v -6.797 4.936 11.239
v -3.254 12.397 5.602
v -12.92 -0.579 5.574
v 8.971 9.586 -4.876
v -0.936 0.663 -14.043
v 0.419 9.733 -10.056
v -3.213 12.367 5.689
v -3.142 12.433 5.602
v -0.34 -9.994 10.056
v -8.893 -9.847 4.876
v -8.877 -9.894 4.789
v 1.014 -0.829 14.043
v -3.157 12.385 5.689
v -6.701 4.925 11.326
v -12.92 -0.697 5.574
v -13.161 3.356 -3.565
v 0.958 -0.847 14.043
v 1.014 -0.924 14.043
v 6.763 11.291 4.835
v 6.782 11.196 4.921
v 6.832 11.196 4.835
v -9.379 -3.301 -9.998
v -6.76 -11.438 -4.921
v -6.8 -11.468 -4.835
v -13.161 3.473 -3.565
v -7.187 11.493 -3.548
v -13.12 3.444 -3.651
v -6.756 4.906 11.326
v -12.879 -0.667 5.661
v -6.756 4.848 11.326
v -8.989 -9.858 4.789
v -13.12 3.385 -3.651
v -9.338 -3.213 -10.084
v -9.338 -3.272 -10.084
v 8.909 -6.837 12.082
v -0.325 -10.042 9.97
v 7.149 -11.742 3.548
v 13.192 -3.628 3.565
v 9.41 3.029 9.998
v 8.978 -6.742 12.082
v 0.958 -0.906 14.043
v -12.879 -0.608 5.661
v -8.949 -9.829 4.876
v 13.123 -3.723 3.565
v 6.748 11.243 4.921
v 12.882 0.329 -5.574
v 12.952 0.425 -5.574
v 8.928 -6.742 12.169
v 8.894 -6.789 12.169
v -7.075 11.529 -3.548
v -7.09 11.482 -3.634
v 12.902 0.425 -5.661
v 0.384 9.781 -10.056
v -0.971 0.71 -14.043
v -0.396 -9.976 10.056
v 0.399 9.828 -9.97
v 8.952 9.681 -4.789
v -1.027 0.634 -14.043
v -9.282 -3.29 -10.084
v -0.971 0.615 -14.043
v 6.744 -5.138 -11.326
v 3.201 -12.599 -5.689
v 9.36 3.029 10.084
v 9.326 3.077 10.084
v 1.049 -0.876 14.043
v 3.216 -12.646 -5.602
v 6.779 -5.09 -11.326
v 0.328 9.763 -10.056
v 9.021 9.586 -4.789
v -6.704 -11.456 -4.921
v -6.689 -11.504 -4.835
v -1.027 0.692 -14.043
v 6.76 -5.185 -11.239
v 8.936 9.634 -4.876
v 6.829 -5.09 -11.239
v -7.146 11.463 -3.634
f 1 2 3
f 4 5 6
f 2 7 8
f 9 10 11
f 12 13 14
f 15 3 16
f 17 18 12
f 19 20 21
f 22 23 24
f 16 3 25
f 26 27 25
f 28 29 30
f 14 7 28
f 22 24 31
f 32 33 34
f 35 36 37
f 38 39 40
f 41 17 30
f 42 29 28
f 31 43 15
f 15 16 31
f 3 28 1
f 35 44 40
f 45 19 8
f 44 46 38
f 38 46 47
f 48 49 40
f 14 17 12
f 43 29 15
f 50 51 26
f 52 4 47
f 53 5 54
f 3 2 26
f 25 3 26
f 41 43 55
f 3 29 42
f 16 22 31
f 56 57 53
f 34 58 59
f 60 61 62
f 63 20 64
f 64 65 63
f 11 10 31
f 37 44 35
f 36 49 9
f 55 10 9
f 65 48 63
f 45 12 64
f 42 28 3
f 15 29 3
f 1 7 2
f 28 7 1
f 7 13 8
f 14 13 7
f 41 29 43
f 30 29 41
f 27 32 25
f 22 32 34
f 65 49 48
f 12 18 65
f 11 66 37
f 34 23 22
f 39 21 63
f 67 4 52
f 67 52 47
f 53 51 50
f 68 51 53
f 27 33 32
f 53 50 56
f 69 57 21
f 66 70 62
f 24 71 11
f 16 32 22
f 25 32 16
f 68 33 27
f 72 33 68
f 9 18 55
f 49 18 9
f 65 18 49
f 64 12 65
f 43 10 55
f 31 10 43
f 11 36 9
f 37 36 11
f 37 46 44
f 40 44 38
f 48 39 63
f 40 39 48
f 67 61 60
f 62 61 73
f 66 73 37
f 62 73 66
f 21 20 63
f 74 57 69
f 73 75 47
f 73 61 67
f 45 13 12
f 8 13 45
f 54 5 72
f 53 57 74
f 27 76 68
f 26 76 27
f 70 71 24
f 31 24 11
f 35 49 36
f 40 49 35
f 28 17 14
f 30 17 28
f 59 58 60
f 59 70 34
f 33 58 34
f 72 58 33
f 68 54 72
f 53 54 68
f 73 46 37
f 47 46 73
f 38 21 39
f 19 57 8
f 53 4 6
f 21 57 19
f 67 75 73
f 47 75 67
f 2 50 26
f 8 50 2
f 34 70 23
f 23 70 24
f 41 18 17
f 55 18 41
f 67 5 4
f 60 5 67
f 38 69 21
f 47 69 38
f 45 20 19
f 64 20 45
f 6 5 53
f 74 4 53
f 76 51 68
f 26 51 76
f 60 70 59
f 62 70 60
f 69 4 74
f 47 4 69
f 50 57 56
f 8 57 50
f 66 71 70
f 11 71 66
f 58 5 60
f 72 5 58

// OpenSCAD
// Auto-generated OpenSCAD file

    inner_points = 10*[[0.0998930354475761, -0.08761839771919257, 1.3956184279718415], [0.6728697039772034, -0.5090233371692008, -1.1239485150914914], [-0.6716026362296299, 0.487698807845633, 1.1239485150914914], [-0.0986259677000027, 0.06629386839562477, -1.3956184279718415], [-0.8908119004872508, -0.979928839088502, 0.47892884316814505], [-0.6719542878696155, -1.1408912029313139, -0.48346009215137703], [0.673221355617189, 1.1195666736077459, 0.48346009215137703], [0.8920789682348242, 0.9586043097649343, -0.47892884316814505], [0.7118307070376008, -1.1647302272134858, 0.35475514127068664], [-1.3079711835867545, 0.3414697712678377, -0.35648592437079285], [1.3092382513343277, -0.36279430059140544, 0.35648592437079285], [-0.7105636392900273, 1.1434056978899179, -0.35475514127068664], [-0.035585740512491165, -0.9946621663535183, 0.9969743473109073], [0.3185333153995008, -1.2551047419607149, -0.5602036604329037], [-1.28389195945964, -0.06377937343702057, 0.5574031945497779], [-0.9297729035476481, -0.3242219490442169, -0.999774813194033], [0.9310399712952215, 0.30289741972064915, 0.999774813194033], [1.2851590272072133, 0.04245484411345278, -0.5574031945497779], [-0.31726624765192735, 1.2337802126371469, 0.5602036604329037], [0.03685280826006457, 0.9733376370299506, -0.9969743473109073], [0.8878158417756826, -0.674182307300777, 1.208213968994985]];

    outer_points = 10*[[0.03282366802055475, -1.3176403726430708, 0.4756805091246931], [-0.08493614308928757, 0.6642367211098263, -1.2308943583788188], [0.08493614308928757, -0.6642367211098263, 1.2308943583788188], [-0.03282366802055475, 1.3176403726430708, -0.4756805091246931], [-1.283421516714085, -0.3785048441443724, 0.4160394031302599], [-1.3284017620492774, 0.3785048441443724, -0.2358141919097333], [1.3284017620492774, -0.3785048441443724, 0.2358141919097333], [1.283421516714085, 0.3785048441443724, -0.4160394031302599], [-0.5670299754236185, -0.8553164840436631, -0.9541678105326641], [-0.43059774445579446, 0.8553164840436631, 1.0230077155892763], [0.43059774445579446, -0.8553164840436631, -1.0230077155892763], [0.5670299754236185, 0.8553164840436631, 0.9541678105326641], [-0.8128678745041953, -1.141048361009117, -0.027927549120190846], [-0.8856474402788453, 0.0838190444550353, -1.0826488215837096], [-0.728548118605104, -0.0838190444550353, 1.194034127747624], [-0.8013276843797541, 1.141048361009117, 0.1393128552841052], [0.8013276843797541, -1.141048361009117, -0.1393128552841052], [0.728548118605104, 0.0838190444550353, -1.194034127747624], [0.8856474402788453, -0.0838190444550353, 1.0826488215837096], [0.8128678745041953, 1.141048361009117, 0.027927549120190846], [-0.033902923914046645, -1.5635173407451266, -0.4913210826453173]];

    // Convex hull for inner set (I)
    module inner_hull() {
        hull() {
            for (p = inner_points) {
                translate(p) sphere(r=0.1);
            }
        }
    }

    // Convex hull for outer set (O) minus inner hull (O \ I)
    module outer_minus_inner() {
        difference() {
            hull() {
                for (p = outer_points) {
                    translate(p) sphere(r=0.1);
                }
            }
            inner_hull(); // Subtract inner hull
        }
    }

    // Convex hull for outer set (O) minus all translated inner hulls
    module outer_minus_AllTranslationInner() {
        difference() {
            hull() {
                for (p = outer_points) {
                    translate(p) sphere(r=0.1);
                }
            }
            hull() {
                translate([0,0,50]) inner_hull();
                translate([0,0,-50]) inner_hull();
            }; // Subtract translated inner hulls
        }
    }

    // Difference between outer_minus_inner and outer_minus_AllTranslationInner
    module outer_minus_inner_diff() {
        difference() {
            // Outer minus inner
            difference() {
                hull() {
                    for (p = outer_points) {
                        translate(p) sphere(r=0.1);
                    }
                }
                inner_hull();
            }

            // Subtract Outer minus AllTranslationInner
            difference() {
                hull() {
                    for (p = outer_points) {
                        translate(p) sphere(r=0.1);
                    }
                }
                hull() {
                    translate([0,0,50]) inner_hull();
                    translate([0,0,-50]) inner_hull();
                };
            }
        }
    }

    // Rendering all with colors applied
    color([1, 0, 0, 0.5]) inner_hull(); // Transparent red
    
